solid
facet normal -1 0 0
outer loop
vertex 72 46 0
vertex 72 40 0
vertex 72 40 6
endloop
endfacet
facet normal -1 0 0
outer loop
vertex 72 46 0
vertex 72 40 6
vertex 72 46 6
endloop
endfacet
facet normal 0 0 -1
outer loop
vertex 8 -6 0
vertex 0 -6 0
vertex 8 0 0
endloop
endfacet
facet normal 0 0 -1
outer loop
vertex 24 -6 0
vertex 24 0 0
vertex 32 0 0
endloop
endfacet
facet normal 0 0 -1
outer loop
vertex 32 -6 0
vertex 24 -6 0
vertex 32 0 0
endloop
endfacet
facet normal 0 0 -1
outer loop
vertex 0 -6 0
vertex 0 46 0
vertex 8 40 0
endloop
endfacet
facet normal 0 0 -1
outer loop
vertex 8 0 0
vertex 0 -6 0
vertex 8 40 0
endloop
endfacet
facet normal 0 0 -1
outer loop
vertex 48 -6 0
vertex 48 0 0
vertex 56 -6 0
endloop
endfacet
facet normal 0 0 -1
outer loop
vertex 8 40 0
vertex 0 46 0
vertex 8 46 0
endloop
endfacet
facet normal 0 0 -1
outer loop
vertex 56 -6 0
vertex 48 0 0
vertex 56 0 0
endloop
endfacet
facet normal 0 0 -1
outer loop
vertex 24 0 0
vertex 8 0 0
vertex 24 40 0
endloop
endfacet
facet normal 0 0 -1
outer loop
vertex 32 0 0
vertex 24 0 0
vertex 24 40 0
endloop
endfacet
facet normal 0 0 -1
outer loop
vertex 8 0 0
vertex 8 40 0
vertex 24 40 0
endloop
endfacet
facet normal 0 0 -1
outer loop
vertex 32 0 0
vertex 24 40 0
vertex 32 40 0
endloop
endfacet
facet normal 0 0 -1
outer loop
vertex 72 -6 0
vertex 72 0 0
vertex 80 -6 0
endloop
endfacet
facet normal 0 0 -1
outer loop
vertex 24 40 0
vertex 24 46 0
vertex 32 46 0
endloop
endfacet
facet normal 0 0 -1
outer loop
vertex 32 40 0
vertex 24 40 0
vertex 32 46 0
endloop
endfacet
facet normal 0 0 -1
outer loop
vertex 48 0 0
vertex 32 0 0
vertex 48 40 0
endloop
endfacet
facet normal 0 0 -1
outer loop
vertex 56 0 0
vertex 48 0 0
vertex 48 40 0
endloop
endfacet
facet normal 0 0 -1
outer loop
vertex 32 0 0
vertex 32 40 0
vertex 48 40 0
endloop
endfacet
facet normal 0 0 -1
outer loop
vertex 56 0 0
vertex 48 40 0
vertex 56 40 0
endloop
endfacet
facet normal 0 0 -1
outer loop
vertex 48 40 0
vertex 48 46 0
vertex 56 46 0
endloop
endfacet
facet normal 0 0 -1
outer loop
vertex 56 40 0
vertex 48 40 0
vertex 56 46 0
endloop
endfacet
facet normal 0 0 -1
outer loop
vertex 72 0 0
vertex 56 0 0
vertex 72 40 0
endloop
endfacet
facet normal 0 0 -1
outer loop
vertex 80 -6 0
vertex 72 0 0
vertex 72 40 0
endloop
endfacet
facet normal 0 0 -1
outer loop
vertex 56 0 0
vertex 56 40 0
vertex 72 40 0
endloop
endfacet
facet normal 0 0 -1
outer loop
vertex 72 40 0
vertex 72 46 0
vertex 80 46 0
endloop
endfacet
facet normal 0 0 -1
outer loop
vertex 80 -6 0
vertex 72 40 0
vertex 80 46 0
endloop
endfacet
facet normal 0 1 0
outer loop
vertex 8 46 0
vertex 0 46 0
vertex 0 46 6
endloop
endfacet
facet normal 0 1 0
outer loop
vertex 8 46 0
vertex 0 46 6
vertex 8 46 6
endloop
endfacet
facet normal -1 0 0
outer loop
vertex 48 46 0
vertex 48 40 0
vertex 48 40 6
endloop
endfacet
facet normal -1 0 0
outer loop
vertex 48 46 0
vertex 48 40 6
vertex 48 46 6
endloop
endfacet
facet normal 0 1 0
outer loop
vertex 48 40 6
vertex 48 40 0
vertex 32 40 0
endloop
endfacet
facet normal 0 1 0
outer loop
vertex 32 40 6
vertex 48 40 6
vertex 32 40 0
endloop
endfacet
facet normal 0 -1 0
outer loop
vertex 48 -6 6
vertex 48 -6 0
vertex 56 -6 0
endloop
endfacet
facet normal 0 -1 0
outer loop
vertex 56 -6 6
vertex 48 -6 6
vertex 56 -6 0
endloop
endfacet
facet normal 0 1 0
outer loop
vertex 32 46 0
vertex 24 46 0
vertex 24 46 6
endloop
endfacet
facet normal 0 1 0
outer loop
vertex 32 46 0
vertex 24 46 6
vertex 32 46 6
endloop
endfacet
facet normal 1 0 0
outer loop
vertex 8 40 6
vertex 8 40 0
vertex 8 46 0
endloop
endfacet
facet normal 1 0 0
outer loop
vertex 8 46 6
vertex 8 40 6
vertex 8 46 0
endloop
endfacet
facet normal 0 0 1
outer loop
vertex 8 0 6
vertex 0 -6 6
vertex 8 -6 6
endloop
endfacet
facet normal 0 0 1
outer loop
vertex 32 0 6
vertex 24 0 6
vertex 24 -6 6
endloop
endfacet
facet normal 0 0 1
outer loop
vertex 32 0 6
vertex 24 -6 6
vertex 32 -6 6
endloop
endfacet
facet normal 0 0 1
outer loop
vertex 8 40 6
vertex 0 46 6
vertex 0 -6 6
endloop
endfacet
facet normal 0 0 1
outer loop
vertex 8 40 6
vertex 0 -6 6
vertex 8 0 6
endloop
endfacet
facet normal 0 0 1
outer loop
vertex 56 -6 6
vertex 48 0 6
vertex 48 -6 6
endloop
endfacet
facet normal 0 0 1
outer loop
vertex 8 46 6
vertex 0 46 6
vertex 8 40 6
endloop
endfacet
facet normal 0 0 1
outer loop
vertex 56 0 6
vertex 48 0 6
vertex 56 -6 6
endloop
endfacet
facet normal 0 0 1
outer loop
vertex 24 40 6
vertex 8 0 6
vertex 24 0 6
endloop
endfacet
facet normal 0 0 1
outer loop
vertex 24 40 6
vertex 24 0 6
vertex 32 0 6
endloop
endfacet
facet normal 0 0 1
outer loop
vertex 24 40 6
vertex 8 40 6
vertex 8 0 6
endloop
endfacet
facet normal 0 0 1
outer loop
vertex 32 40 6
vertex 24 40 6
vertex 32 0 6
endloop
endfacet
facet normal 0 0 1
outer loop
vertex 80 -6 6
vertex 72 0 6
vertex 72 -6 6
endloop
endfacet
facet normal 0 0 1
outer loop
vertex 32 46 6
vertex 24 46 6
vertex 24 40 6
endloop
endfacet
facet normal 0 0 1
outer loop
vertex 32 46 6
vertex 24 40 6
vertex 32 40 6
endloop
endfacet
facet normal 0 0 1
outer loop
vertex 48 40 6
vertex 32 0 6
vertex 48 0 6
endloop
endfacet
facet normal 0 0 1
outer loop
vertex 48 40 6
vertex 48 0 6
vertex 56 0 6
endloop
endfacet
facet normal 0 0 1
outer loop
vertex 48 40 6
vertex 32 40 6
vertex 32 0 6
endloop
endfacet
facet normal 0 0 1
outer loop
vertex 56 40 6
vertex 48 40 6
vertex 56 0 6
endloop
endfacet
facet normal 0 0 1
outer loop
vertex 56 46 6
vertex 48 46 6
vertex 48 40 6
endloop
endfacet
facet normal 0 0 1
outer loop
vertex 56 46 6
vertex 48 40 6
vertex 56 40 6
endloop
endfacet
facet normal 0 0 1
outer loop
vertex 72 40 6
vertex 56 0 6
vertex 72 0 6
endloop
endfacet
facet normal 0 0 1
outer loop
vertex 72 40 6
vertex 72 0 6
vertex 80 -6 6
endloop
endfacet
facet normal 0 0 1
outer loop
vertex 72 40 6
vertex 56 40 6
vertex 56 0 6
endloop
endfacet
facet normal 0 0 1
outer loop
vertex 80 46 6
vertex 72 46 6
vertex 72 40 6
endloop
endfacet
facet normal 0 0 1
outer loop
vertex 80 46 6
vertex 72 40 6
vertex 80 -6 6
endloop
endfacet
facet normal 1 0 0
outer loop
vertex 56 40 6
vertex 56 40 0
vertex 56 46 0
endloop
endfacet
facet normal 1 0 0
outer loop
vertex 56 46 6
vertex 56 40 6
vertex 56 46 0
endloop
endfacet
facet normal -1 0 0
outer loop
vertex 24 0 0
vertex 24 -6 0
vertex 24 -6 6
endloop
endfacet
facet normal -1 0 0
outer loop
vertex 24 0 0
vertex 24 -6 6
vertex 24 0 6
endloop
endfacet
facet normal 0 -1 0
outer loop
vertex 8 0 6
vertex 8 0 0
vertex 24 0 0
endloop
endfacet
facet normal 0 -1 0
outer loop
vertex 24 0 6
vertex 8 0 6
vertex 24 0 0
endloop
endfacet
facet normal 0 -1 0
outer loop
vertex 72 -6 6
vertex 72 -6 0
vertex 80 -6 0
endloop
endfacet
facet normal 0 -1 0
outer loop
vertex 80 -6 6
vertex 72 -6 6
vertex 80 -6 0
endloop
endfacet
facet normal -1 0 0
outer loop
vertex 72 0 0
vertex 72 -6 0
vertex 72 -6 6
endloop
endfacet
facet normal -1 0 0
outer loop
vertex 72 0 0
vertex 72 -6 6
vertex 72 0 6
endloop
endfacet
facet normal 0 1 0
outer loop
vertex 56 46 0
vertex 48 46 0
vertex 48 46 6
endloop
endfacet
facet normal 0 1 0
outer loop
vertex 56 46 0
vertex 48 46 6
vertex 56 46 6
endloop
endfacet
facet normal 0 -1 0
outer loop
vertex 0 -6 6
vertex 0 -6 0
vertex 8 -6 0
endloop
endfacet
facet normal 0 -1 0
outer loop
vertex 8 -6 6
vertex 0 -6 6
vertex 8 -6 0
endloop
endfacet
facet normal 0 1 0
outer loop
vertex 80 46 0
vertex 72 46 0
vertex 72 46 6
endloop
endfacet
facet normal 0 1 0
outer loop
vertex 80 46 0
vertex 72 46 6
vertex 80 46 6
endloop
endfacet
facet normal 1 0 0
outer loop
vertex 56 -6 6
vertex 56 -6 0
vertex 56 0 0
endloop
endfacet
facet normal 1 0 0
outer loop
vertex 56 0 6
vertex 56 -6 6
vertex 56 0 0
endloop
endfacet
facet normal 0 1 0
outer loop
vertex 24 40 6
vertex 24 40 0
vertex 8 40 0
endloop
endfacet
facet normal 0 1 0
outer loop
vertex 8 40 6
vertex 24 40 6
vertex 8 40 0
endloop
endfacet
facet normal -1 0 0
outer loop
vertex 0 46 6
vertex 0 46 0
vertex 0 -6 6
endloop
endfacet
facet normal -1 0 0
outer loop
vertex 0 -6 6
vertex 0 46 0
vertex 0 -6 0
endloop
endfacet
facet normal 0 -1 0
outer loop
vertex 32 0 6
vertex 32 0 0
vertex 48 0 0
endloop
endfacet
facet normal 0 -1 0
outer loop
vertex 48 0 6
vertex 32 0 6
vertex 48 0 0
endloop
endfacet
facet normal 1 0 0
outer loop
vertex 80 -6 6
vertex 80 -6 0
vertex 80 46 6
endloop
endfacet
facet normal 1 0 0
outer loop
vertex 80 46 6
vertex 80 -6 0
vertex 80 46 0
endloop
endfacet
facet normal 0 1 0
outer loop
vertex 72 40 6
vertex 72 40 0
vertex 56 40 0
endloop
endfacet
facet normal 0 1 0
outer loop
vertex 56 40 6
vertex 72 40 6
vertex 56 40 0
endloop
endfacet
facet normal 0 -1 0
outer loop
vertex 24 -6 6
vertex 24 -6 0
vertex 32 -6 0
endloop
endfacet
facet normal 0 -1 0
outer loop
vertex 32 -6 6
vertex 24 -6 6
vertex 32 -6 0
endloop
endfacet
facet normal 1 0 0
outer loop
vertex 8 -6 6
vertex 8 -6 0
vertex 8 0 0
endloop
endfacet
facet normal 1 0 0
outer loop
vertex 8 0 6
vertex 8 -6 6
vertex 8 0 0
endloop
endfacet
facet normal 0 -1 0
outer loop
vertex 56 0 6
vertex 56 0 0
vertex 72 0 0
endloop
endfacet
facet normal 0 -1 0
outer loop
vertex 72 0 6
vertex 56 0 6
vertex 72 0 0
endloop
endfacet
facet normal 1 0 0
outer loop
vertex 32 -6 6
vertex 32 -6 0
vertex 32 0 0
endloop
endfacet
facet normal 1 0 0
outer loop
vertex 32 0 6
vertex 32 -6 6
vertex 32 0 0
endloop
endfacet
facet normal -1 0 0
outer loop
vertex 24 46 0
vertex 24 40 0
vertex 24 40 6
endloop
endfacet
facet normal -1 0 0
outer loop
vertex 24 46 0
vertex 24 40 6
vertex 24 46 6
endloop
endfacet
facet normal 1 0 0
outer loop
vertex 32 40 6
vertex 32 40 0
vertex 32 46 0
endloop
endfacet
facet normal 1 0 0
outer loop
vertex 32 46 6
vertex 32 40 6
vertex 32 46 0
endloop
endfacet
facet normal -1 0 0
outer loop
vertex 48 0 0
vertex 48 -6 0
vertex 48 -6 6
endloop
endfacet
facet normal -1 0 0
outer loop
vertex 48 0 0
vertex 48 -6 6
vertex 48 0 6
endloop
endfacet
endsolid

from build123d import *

# Parameters (mm, degrees)
ESQUISSE1_W        = 8
ESQUISSE1_H        = 6
BOSS_EXTRU_1_DEPTH = 6


with BuildPart() as part:
    # Esquisse1 → Boss.-Extru.1 (new body)
    with BuildSketch(Plane.XY):
        with Locations((4, -3)):
            Rectangle(ESQUISSE1_W, ESQUISSE1_H)
        with Locations((28, -3)):
            Rectangle(ESQUISSE1_W, ESQUISSE1_H)
        with Locations((52, -3)):
            Rectangle(ESQUISSE1_W, ESQUISSE1_H)
        Polygon((80, 20), (0, 20), (0, 0), (8, 0), (24, 0), (32, 0), (48, 0), (56, 0), (72, 0), (80, 0), align=None)
        Polygon((0, 40), (0, 20), (80, 20), (80, 40), (72, 40), (56, 40), (48, 40), (32, 40), (24, 40), (8, 40), align=None)
        with Locations((76, 43)):
            Rectangle(ESQUISSE1_W, ESQUISSE1_H)
        with Locations((52, 43)):
            Rectangle(ESQUISSE1_W, ESQUISSE1_H)
        with Locations((28, 43)):
            Rectangle(ESQUISSE1_W, ESQUISSE1_H)
        with Locations((4, 43)):
            Rectangle(ESQUISSE1_W, ESQUISSE1_H)
        with Locations((76, -3)):
            Rectangle(ESQUISSE1_W, ESQUISSE1_H)
    extrude(amount=BOSS_EXTRU_1_DEPTH)


solid = part.part
